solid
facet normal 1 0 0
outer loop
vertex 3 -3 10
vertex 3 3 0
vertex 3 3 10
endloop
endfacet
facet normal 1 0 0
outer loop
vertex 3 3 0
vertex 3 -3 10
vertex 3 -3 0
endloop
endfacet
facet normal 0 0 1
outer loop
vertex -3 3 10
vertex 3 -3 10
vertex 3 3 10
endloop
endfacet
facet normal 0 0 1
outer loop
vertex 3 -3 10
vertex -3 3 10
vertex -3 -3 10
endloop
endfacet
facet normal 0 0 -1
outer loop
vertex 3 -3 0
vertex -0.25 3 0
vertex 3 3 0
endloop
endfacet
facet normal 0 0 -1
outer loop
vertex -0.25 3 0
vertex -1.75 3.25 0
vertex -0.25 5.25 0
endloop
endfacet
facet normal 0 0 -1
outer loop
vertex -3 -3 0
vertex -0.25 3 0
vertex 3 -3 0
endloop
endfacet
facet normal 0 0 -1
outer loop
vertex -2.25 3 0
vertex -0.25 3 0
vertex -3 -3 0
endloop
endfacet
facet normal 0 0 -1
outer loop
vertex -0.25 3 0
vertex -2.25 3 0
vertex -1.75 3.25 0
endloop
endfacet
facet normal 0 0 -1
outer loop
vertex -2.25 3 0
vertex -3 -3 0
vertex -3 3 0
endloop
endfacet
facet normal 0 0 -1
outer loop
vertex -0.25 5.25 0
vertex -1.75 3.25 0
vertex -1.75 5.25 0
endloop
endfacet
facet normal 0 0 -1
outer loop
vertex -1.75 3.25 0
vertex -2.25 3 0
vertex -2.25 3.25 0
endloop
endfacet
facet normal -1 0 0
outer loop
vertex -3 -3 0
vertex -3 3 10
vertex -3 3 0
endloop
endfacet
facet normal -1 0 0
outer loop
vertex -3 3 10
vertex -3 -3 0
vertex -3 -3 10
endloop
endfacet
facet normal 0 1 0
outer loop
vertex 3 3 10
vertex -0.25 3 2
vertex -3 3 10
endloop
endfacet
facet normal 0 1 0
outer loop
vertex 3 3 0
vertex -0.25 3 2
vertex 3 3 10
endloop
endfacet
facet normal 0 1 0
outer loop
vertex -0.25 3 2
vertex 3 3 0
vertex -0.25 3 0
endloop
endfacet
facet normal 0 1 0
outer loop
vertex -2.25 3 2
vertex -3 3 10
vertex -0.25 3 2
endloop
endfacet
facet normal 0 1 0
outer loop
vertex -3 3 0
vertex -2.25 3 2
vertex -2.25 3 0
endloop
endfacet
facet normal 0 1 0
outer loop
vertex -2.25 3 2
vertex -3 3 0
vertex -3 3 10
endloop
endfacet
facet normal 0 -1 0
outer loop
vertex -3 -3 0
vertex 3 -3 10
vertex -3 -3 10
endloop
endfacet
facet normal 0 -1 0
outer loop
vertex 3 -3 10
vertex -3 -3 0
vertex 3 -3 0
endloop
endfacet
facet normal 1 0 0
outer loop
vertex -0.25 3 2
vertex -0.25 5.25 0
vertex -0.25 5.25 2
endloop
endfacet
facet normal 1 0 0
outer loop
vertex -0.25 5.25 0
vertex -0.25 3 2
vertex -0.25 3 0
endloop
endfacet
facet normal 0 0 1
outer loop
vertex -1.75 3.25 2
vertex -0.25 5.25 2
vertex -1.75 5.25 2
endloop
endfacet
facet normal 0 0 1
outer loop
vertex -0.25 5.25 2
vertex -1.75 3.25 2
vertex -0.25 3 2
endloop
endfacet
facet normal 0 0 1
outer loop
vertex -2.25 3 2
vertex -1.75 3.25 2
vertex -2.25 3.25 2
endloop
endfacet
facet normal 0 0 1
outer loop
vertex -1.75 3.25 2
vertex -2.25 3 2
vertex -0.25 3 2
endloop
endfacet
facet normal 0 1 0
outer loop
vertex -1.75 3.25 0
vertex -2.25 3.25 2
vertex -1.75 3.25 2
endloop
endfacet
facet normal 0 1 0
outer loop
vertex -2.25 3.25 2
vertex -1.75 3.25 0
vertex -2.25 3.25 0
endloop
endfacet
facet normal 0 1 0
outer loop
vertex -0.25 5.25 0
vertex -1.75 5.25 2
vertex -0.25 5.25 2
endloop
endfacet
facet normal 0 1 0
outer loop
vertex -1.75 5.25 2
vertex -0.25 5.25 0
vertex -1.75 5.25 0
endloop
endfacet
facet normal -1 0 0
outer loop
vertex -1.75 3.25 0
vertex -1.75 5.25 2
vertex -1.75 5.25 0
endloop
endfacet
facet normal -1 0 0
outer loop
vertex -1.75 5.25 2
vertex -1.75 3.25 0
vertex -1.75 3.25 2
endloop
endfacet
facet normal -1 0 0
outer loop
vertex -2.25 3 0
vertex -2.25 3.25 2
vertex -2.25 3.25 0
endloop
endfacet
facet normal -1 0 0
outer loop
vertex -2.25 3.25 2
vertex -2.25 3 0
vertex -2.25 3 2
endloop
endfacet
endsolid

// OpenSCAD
translate([0, 0, 5]) color([0,1,0,0.9]) cube([6, 6, 10], center=true);
translate([-0.5, 0.0, 1]) color([1,0,0]) cube([0.5, 0.5, 2], center=true);
translate([-0.5, 0.5, 1]) color([1,0,0]) cube([0.5, 0.5, 2], center=true);
translate([-0.5, 1.0, 1]) color([1,0,0]) cube([0.5, 0.5, 2], center=true);
translate([-0.5, 1.5, 1]) color([1,0,0]) cube([0.5, 0.5, 2], center=true);
translate([-0.5, 2.0, 1]) color([1,0,0]) cube([0.5, 0.5, 2], center=true);
translate([-0.5, 2.5, 1]) color([1,0,0]) cube([0.5, 0.5, 2], center=true);
translate([-0.5, 3.0, 1]) color([1,0,0]) cube([0.5, 0.5, 2], center=true);
translate([-0.5, 3.5, 1]) color([1,0,0]) cube([0.5, 0.5, 2], center=true);
translate([-0.5, 4.0, 1]) color([1,0,0]) cube([0.5, 0.5, 2], center=true);
translate([-0.5, 4.5, 1]) color([1,0,0]) cube([0.5, 0.5, 2], center=true);
translate([-0.5, 5.0, 1]) color([1,0,0]) cube([0.5, 0.5, 2], center=true);
translate([-1.0, 0.0, 1]) color([1,0,0]) cube([0.5, 0.5, 2], center=true);
translate([-1.0, 0.5, 1]) color([1,0,0]) cube([0.5, 0.5, 2], center=true);
translate([-1.0, 1.0, 1]) color([1,0,0]) cube([0.5, 0.5, 2], center=true);
translate([-1.0, 1.5, 1]) color([1,0,0]) cube([0.5, 0.5, 2], center=true);
translate([-1.0, 2.0, 1]) color([1,0,0]) cube([0.5, 0.5, 2], center=true);
translate([-1.0, 2.5, 1]) color([1,0,0]) cube([0.5, 0.5, 2], center=true);
translate([-1.0, 3.0, 1]) color([1,0,0]) cube([0.5, 0.5, 2], center=true);
translate([-1.0, 3.5, 1]) color([1,0,0]) cube([0.5, 0.5, 2], center=true);
translate([-1.0, 4.0, 1]) color([1,0,0]) cube([0.5, 0.5, 2], center=true);
translate([-1.0, 4.5, 1]) color([1,0,0]) cube([0.5, 0.5, 2], center=true);
translate([-1.0, 5.0, 1]) color([1,0,0]) cube([0.5, 0.5, 2], center=true);
translate([-1.5, 0.0, 1]) color([1,0,0]) cube([0.5, 0.5, 2], center=true);
translate([-1.5, 0.5, 1]) color([1,0,0]) cube([0.5, 0.5, 2], center=true);
translate([-1.5, 1.0, 1]) color([1,0,0]) cube([0.5, 0.5, 2], center=true);
translate([-1.5, 1.5, 1]) color([1,0,0]) cube([0.5, 0.5, 2], center=true);
translate([-1.5, 2.0, 1]) color([1,0,0]) cube([0.5, 0.5, 2], center=true);
translate([-1.5, 2.5, 1]) color([1,0,0]) cube([0.5, 0.5, 2], center=true);
translate([-1.5, 3.0, 1]) color([1,0,0]) cube([0.5, 0.5, 2], center=true);
translate([-1.5, 3.5, 1]) color([1,0,0]) cube([0.5, 0.5, 2], center=true);
translate([-1.5, 4.0, 1]) color([1,0,0]) cube([0.5, 0.5, 2], center=true);
translate([-1.5, 4.5, 1]) color([1,0,0]) cube([0.5, 0.5, 2], center=true);
translate([-1.5, 5.0, 1]) color([1,0,0]) cube([0.5, 0.5, 2], center=true);
translate([-2.0, 0.0, 1]) color([1,0,0]) cube([0.5, 0.5, 2], center=true);
translate([-2.0, 0.5, 1]) color([1,0,0]) cube([0.5, 0.5, 2], center=true);
translate([-2.0, 1.0, 1]) color([1,0,0]) cube([0.5, 0.5, 2], center=true);
translate([-2.0, 1.5, 1]) color([1,0,0]) cube([0.5, 0.5, 2], center=true);
translate([-2.0, 2.0, 1]) color([1,0,0]) cube([0.5, 0.5, 2], center=true);
translate([-2.0, 2.5, 1]) color([1,0,0]) cube([0.5, 0.5, 2], center=true);
translate([-2.0, 3.0, 1]) color([1,0,0]) cube([0.5, 0.5, 2], center=true);
